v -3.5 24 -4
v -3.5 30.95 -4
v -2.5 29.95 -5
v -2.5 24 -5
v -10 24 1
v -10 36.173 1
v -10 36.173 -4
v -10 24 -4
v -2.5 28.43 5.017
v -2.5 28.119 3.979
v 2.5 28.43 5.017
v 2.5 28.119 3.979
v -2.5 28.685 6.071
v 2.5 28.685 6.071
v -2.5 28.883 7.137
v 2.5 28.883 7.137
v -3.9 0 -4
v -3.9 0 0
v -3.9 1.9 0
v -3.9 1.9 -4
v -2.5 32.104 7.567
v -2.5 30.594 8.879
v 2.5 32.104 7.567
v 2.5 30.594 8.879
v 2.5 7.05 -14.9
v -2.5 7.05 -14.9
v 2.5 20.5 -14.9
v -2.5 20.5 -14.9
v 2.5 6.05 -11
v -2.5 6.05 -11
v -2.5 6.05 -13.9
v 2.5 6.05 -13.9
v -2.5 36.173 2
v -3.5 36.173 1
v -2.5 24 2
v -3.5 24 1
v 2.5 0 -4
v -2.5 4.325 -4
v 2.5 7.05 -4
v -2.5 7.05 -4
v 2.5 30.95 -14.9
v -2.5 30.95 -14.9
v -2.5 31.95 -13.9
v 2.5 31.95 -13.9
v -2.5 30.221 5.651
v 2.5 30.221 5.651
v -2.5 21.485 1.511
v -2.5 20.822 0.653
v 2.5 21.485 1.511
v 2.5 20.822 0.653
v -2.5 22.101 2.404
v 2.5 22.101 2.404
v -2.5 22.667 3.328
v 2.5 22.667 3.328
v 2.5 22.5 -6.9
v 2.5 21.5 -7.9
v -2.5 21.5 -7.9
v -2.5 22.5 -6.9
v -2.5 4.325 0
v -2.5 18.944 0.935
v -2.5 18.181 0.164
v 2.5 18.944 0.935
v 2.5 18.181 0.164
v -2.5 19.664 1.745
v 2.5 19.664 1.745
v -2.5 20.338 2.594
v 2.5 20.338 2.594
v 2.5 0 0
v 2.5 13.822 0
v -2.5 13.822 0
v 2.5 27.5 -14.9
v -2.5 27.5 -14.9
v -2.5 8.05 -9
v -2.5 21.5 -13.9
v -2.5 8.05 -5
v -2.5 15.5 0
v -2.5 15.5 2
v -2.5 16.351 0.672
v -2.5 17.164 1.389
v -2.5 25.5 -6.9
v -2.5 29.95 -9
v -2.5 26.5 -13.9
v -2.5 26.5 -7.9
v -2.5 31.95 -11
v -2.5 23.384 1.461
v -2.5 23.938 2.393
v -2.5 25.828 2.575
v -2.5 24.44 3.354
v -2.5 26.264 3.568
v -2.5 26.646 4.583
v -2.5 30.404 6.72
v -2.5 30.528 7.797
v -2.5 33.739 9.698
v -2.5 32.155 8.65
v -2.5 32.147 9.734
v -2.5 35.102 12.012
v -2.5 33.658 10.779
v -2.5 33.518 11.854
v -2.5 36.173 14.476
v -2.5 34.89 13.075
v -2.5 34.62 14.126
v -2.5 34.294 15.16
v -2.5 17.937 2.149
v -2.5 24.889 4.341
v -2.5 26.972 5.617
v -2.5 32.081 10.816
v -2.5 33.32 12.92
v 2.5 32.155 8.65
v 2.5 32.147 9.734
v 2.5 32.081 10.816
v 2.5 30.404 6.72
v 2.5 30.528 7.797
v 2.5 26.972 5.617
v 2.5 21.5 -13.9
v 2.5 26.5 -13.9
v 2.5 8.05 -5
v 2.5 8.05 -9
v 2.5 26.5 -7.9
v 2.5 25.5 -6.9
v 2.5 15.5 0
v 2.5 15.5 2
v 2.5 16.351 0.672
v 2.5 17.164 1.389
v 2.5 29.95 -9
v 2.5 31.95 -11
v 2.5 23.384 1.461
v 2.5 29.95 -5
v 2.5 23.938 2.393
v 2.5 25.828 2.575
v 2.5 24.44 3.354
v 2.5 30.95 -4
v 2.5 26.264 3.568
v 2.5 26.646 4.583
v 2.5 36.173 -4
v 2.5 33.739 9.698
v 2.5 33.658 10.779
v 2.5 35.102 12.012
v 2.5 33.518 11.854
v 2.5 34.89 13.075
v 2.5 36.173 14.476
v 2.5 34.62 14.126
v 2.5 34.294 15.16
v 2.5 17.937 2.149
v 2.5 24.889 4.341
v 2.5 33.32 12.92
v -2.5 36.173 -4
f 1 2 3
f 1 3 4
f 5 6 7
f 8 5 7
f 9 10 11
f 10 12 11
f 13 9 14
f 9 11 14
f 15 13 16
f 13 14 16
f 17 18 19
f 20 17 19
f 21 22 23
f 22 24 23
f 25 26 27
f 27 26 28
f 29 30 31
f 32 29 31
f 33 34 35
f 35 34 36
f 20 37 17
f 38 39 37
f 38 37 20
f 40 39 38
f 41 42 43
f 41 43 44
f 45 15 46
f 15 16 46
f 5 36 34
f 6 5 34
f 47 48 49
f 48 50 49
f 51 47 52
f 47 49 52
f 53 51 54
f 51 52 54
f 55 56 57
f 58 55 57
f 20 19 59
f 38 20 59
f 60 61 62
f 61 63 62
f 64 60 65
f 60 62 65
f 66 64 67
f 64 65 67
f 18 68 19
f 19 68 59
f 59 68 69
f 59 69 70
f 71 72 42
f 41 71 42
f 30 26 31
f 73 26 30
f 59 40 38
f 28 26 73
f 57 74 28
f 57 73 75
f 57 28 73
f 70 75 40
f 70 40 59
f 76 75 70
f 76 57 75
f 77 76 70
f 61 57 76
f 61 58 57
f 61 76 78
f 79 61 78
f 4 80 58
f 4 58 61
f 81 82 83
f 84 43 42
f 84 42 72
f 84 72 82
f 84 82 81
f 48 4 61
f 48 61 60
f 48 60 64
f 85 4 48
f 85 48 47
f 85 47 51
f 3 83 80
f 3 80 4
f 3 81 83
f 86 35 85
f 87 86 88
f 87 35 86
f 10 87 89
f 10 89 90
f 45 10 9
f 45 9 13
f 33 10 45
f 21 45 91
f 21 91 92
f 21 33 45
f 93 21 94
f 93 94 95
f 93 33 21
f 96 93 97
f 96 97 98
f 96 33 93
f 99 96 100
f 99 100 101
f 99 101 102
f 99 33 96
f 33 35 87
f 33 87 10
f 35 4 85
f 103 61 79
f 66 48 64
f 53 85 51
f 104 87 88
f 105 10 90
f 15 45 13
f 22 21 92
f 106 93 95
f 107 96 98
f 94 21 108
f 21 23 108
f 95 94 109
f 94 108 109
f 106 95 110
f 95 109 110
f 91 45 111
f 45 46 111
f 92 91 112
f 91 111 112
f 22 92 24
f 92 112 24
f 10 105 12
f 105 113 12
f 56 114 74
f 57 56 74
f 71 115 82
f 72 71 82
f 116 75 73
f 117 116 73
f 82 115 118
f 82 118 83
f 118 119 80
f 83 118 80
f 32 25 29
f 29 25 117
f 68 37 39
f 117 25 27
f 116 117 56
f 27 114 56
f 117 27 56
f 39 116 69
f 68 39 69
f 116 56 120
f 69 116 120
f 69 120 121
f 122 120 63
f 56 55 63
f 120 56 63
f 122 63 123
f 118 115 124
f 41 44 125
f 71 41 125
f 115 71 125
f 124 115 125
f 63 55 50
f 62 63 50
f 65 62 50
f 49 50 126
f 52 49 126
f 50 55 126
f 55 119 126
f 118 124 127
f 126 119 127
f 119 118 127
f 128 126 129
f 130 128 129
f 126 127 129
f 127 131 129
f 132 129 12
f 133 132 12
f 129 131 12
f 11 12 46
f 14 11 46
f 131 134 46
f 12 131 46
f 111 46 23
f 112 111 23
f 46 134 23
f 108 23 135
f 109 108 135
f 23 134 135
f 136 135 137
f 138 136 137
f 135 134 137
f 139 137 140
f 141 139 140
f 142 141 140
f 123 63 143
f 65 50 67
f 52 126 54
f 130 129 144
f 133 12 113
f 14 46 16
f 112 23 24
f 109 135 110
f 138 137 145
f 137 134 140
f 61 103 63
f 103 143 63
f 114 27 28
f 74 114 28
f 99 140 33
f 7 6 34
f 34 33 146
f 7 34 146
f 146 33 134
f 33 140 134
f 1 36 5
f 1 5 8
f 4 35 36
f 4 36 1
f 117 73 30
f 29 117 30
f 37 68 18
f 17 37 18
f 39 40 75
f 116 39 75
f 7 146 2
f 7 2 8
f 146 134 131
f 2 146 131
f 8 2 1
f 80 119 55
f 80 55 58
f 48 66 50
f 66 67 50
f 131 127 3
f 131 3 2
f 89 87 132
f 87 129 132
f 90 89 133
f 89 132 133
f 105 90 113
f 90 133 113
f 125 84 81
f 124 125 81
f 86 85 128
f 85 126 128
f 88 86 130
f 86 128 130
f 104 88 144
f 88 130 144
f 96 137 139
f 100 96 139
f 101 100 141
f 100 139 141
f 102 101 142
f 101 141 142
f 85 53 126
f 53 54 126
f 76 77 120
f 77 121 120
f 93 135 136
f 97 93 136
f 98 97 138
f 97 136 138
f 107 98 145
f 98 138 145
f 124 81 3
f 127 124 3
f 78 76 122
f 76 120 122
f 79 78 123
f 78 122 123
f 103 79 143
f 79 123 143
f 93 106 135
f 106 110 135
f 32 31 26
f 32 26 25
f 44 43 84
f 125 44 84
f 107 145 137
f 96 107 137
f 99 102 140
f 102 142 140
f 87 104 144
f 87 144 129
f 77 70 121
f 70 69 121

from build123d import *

# Parameters (mm, degrees)
EXTRUDE_1_DEPTH     = 2.5
EXTRUDE_START       = -2.5
EXTRUDE_2_DEPTH     = 5
EXTRUDE_4_DEPTH     = 4
SKETCH_9_W          = 5
SKETCH_9_H          = 5
CUT_EXTRUDE_4_DEPTH = 8
SKETCH_10_W         = 5
SKETCH_10_H         = 12.173237657
EXTRUDE_5_DEPTH     = 10
CHAMFER_2_SIZE      = 1
CHAMFER_3_SIZE      = 1


with BuildPart() as part:
    # 草图1 → 凸台-拉伸1 (new body, symmetric)
    with BuildSketch(Plane(origin=(0, 0, 0), x_dir=(0, 0, -1), z_dir=(1, 0, 0))):
        with BuildLine():
            ThreePointArc((-12.012209006, 35.102143532), (-13.602346238, 34.762025687), (-15.159597133, 34.293852416))
            Line((-15.159597133, 34.293852416), (-14.475556847, 36.173237657))
            Line((-14.475556847, 36.173237657), (0, 36.173237657))
            Line((0, 36.173237657), (4, 36.173237657))
            Line((4, 36.173237657), (4, 0))
            Line((4, 0), (0, 0))
            Line((0, 0), (0, 13.821800738))
            Line((0, 13.821800738), (-2, 15.5))
            Line((-2, 15.5), (0, 15.5))
            ThreePointArc((0, 15.5), (-1.024954416, 16.762412377), (-2.149076967, 17.937386868))
            Line((-2.149076967, 17.937386868), (-0.163984664, 18.181125555))
            ThreePointArc((-0.163984664, 18.181125555), (-1.335148592, 19.30921758), (-2.594085474, 20.338437912))
            Line((-2.594085474, 20.338437912), (-0.653494022, 20.822281703))
            ThreePointArc((-0.653494022, 20.822281703), (-1.953408107, 21.799236122), (-3.32839147, 22.667358991))
            Line((-3.32839147, 22.667358991), (-1.461230617, 23.38409489))
            ThreePointArc((-1.461230617, 23.38409489), (-2.870516133, 24.195347563), (-4.341048143, 24.889431256))
            Line((-4.341048143, 24.889431256), (-2.575152957, 25.828374381))
            ThreePointArc((-2.575152957, 25.828374381), (-4.072800703, 26.4618314), (-5.616959114, 26.971528727))
            Line((-5.616959114, 26.971528727), (-3.978655026, 28.1186816))
            ThreePointArc((-3.978655026, 28.1186816), (-5.542338523, 28.564899578), (-7.13710349, 28.882612127))
            Line((-7.13710349, 28.882612127), (-5.65081384, 30.22087334))
            ThreePointArc((-5.65081384, 30.22087334), (-7.257222169, 30.473200196), (-8.87881942, 30.594191604))
            Line((-8.87881942, 30.594191604), (-7.566701362, 32.103610765))
            ThreePointArc((-7.566701362, 32.103610765), (-9.191886676, 32.158284886), (-10.816141931, 32.080751451))
            Line((-10.816141931, 32.080751451), (-9.697756124, 33.738826596))
            ThreePointArc((-9.697756124, 33.738826596), (-11.317490652, 33.595032918), (-12.920190005, 33.320130484))
            Line((-12.920190005, 33.320130484), (-12.012209006, 35.102143532))
        make_face()
    extrude(amount=EXTRUDE_1_DEPTH, both=True)

    # 草图6 → 凸台-拉伸2 (add)
    with BuildSketch(Plane(origin=(0, 0, 0), x_dir=(0, 0, -1), z_dir=(1, 0, 0)).offset(EXTRUDE_START)):
        Polygon((14.9, 31.95), (11, 31.95), (9, 29.95), (5, 29.95), (4, 30.95), (4, 7.05), (5, 8.05), (9, 8.05), (11, 6.05), (14.9, 6.05), align=None)
    extrude(amount=EXTRUDE_2_DEPTH)

    # 草图8 → 凸台-拉伸4 (add)
    with BuildSketch(Plane.XY):
        Polygon((-2.5, 0), (-3.9, 0), (-3.9, 1.9), (-2.5, 4.324871131), align=None)
    extrude(amount=-EXTRUDE_4_DEPTH)

    # 草图9 → 切除-拉伸4 (cut)
    with BuildSketch(Plane(origin=(0, 0, -14.9), x_dir=(-1, 0, 0), z_dir=(0, 0, -1))):
        with Locations((0, 24)):
            Rectangle(SKETCH_9_W, SKETCH_9_H)
    extrude(amount=-CUT_EXTRUDE_4_DEPTH, mode=Mode.SUBTRACT)

    # 草图10 → 凸台-拉伸5 (add)
    with BuildSketch(Plane(origin=(0, 0, 0), x_dir=(0, 0, -1), z_dir=(1, 0, 0))):
        with Locations((1.5, 30.086618829)):
            Rectangle(SKETCH_10_W, SKETCH_10_H)
    extrude(amount=-EXTRUDE_5_DEPTH)

    # 倒角2
    chamfer_2_edges = [part.edges().sort_by_distance(p)[0] for p in [
        (0, 26.5, -14.9),
        (0, 21.5, -6.9),
        (0, 26.5, -6.9),
        (0, 21.5, -14.9),
        (0, 6.05, -14.9),
        (0, 31.95, -14.9),
    ]]
    chamfer(chamfer_2_edges, length=CHAMFER_2_SIZE)

    # 倒角3
    chamfer_3_edges = [part.edges().sort_by_distance(p)[0] for p in [
        (-2.5, 30.086618829, 1),
        (-2.5, 27.475, -4),
    ]]
    chamfer(chamfer_3_edges, length=CHAMFER_3_SIZE)


solid = part.part
